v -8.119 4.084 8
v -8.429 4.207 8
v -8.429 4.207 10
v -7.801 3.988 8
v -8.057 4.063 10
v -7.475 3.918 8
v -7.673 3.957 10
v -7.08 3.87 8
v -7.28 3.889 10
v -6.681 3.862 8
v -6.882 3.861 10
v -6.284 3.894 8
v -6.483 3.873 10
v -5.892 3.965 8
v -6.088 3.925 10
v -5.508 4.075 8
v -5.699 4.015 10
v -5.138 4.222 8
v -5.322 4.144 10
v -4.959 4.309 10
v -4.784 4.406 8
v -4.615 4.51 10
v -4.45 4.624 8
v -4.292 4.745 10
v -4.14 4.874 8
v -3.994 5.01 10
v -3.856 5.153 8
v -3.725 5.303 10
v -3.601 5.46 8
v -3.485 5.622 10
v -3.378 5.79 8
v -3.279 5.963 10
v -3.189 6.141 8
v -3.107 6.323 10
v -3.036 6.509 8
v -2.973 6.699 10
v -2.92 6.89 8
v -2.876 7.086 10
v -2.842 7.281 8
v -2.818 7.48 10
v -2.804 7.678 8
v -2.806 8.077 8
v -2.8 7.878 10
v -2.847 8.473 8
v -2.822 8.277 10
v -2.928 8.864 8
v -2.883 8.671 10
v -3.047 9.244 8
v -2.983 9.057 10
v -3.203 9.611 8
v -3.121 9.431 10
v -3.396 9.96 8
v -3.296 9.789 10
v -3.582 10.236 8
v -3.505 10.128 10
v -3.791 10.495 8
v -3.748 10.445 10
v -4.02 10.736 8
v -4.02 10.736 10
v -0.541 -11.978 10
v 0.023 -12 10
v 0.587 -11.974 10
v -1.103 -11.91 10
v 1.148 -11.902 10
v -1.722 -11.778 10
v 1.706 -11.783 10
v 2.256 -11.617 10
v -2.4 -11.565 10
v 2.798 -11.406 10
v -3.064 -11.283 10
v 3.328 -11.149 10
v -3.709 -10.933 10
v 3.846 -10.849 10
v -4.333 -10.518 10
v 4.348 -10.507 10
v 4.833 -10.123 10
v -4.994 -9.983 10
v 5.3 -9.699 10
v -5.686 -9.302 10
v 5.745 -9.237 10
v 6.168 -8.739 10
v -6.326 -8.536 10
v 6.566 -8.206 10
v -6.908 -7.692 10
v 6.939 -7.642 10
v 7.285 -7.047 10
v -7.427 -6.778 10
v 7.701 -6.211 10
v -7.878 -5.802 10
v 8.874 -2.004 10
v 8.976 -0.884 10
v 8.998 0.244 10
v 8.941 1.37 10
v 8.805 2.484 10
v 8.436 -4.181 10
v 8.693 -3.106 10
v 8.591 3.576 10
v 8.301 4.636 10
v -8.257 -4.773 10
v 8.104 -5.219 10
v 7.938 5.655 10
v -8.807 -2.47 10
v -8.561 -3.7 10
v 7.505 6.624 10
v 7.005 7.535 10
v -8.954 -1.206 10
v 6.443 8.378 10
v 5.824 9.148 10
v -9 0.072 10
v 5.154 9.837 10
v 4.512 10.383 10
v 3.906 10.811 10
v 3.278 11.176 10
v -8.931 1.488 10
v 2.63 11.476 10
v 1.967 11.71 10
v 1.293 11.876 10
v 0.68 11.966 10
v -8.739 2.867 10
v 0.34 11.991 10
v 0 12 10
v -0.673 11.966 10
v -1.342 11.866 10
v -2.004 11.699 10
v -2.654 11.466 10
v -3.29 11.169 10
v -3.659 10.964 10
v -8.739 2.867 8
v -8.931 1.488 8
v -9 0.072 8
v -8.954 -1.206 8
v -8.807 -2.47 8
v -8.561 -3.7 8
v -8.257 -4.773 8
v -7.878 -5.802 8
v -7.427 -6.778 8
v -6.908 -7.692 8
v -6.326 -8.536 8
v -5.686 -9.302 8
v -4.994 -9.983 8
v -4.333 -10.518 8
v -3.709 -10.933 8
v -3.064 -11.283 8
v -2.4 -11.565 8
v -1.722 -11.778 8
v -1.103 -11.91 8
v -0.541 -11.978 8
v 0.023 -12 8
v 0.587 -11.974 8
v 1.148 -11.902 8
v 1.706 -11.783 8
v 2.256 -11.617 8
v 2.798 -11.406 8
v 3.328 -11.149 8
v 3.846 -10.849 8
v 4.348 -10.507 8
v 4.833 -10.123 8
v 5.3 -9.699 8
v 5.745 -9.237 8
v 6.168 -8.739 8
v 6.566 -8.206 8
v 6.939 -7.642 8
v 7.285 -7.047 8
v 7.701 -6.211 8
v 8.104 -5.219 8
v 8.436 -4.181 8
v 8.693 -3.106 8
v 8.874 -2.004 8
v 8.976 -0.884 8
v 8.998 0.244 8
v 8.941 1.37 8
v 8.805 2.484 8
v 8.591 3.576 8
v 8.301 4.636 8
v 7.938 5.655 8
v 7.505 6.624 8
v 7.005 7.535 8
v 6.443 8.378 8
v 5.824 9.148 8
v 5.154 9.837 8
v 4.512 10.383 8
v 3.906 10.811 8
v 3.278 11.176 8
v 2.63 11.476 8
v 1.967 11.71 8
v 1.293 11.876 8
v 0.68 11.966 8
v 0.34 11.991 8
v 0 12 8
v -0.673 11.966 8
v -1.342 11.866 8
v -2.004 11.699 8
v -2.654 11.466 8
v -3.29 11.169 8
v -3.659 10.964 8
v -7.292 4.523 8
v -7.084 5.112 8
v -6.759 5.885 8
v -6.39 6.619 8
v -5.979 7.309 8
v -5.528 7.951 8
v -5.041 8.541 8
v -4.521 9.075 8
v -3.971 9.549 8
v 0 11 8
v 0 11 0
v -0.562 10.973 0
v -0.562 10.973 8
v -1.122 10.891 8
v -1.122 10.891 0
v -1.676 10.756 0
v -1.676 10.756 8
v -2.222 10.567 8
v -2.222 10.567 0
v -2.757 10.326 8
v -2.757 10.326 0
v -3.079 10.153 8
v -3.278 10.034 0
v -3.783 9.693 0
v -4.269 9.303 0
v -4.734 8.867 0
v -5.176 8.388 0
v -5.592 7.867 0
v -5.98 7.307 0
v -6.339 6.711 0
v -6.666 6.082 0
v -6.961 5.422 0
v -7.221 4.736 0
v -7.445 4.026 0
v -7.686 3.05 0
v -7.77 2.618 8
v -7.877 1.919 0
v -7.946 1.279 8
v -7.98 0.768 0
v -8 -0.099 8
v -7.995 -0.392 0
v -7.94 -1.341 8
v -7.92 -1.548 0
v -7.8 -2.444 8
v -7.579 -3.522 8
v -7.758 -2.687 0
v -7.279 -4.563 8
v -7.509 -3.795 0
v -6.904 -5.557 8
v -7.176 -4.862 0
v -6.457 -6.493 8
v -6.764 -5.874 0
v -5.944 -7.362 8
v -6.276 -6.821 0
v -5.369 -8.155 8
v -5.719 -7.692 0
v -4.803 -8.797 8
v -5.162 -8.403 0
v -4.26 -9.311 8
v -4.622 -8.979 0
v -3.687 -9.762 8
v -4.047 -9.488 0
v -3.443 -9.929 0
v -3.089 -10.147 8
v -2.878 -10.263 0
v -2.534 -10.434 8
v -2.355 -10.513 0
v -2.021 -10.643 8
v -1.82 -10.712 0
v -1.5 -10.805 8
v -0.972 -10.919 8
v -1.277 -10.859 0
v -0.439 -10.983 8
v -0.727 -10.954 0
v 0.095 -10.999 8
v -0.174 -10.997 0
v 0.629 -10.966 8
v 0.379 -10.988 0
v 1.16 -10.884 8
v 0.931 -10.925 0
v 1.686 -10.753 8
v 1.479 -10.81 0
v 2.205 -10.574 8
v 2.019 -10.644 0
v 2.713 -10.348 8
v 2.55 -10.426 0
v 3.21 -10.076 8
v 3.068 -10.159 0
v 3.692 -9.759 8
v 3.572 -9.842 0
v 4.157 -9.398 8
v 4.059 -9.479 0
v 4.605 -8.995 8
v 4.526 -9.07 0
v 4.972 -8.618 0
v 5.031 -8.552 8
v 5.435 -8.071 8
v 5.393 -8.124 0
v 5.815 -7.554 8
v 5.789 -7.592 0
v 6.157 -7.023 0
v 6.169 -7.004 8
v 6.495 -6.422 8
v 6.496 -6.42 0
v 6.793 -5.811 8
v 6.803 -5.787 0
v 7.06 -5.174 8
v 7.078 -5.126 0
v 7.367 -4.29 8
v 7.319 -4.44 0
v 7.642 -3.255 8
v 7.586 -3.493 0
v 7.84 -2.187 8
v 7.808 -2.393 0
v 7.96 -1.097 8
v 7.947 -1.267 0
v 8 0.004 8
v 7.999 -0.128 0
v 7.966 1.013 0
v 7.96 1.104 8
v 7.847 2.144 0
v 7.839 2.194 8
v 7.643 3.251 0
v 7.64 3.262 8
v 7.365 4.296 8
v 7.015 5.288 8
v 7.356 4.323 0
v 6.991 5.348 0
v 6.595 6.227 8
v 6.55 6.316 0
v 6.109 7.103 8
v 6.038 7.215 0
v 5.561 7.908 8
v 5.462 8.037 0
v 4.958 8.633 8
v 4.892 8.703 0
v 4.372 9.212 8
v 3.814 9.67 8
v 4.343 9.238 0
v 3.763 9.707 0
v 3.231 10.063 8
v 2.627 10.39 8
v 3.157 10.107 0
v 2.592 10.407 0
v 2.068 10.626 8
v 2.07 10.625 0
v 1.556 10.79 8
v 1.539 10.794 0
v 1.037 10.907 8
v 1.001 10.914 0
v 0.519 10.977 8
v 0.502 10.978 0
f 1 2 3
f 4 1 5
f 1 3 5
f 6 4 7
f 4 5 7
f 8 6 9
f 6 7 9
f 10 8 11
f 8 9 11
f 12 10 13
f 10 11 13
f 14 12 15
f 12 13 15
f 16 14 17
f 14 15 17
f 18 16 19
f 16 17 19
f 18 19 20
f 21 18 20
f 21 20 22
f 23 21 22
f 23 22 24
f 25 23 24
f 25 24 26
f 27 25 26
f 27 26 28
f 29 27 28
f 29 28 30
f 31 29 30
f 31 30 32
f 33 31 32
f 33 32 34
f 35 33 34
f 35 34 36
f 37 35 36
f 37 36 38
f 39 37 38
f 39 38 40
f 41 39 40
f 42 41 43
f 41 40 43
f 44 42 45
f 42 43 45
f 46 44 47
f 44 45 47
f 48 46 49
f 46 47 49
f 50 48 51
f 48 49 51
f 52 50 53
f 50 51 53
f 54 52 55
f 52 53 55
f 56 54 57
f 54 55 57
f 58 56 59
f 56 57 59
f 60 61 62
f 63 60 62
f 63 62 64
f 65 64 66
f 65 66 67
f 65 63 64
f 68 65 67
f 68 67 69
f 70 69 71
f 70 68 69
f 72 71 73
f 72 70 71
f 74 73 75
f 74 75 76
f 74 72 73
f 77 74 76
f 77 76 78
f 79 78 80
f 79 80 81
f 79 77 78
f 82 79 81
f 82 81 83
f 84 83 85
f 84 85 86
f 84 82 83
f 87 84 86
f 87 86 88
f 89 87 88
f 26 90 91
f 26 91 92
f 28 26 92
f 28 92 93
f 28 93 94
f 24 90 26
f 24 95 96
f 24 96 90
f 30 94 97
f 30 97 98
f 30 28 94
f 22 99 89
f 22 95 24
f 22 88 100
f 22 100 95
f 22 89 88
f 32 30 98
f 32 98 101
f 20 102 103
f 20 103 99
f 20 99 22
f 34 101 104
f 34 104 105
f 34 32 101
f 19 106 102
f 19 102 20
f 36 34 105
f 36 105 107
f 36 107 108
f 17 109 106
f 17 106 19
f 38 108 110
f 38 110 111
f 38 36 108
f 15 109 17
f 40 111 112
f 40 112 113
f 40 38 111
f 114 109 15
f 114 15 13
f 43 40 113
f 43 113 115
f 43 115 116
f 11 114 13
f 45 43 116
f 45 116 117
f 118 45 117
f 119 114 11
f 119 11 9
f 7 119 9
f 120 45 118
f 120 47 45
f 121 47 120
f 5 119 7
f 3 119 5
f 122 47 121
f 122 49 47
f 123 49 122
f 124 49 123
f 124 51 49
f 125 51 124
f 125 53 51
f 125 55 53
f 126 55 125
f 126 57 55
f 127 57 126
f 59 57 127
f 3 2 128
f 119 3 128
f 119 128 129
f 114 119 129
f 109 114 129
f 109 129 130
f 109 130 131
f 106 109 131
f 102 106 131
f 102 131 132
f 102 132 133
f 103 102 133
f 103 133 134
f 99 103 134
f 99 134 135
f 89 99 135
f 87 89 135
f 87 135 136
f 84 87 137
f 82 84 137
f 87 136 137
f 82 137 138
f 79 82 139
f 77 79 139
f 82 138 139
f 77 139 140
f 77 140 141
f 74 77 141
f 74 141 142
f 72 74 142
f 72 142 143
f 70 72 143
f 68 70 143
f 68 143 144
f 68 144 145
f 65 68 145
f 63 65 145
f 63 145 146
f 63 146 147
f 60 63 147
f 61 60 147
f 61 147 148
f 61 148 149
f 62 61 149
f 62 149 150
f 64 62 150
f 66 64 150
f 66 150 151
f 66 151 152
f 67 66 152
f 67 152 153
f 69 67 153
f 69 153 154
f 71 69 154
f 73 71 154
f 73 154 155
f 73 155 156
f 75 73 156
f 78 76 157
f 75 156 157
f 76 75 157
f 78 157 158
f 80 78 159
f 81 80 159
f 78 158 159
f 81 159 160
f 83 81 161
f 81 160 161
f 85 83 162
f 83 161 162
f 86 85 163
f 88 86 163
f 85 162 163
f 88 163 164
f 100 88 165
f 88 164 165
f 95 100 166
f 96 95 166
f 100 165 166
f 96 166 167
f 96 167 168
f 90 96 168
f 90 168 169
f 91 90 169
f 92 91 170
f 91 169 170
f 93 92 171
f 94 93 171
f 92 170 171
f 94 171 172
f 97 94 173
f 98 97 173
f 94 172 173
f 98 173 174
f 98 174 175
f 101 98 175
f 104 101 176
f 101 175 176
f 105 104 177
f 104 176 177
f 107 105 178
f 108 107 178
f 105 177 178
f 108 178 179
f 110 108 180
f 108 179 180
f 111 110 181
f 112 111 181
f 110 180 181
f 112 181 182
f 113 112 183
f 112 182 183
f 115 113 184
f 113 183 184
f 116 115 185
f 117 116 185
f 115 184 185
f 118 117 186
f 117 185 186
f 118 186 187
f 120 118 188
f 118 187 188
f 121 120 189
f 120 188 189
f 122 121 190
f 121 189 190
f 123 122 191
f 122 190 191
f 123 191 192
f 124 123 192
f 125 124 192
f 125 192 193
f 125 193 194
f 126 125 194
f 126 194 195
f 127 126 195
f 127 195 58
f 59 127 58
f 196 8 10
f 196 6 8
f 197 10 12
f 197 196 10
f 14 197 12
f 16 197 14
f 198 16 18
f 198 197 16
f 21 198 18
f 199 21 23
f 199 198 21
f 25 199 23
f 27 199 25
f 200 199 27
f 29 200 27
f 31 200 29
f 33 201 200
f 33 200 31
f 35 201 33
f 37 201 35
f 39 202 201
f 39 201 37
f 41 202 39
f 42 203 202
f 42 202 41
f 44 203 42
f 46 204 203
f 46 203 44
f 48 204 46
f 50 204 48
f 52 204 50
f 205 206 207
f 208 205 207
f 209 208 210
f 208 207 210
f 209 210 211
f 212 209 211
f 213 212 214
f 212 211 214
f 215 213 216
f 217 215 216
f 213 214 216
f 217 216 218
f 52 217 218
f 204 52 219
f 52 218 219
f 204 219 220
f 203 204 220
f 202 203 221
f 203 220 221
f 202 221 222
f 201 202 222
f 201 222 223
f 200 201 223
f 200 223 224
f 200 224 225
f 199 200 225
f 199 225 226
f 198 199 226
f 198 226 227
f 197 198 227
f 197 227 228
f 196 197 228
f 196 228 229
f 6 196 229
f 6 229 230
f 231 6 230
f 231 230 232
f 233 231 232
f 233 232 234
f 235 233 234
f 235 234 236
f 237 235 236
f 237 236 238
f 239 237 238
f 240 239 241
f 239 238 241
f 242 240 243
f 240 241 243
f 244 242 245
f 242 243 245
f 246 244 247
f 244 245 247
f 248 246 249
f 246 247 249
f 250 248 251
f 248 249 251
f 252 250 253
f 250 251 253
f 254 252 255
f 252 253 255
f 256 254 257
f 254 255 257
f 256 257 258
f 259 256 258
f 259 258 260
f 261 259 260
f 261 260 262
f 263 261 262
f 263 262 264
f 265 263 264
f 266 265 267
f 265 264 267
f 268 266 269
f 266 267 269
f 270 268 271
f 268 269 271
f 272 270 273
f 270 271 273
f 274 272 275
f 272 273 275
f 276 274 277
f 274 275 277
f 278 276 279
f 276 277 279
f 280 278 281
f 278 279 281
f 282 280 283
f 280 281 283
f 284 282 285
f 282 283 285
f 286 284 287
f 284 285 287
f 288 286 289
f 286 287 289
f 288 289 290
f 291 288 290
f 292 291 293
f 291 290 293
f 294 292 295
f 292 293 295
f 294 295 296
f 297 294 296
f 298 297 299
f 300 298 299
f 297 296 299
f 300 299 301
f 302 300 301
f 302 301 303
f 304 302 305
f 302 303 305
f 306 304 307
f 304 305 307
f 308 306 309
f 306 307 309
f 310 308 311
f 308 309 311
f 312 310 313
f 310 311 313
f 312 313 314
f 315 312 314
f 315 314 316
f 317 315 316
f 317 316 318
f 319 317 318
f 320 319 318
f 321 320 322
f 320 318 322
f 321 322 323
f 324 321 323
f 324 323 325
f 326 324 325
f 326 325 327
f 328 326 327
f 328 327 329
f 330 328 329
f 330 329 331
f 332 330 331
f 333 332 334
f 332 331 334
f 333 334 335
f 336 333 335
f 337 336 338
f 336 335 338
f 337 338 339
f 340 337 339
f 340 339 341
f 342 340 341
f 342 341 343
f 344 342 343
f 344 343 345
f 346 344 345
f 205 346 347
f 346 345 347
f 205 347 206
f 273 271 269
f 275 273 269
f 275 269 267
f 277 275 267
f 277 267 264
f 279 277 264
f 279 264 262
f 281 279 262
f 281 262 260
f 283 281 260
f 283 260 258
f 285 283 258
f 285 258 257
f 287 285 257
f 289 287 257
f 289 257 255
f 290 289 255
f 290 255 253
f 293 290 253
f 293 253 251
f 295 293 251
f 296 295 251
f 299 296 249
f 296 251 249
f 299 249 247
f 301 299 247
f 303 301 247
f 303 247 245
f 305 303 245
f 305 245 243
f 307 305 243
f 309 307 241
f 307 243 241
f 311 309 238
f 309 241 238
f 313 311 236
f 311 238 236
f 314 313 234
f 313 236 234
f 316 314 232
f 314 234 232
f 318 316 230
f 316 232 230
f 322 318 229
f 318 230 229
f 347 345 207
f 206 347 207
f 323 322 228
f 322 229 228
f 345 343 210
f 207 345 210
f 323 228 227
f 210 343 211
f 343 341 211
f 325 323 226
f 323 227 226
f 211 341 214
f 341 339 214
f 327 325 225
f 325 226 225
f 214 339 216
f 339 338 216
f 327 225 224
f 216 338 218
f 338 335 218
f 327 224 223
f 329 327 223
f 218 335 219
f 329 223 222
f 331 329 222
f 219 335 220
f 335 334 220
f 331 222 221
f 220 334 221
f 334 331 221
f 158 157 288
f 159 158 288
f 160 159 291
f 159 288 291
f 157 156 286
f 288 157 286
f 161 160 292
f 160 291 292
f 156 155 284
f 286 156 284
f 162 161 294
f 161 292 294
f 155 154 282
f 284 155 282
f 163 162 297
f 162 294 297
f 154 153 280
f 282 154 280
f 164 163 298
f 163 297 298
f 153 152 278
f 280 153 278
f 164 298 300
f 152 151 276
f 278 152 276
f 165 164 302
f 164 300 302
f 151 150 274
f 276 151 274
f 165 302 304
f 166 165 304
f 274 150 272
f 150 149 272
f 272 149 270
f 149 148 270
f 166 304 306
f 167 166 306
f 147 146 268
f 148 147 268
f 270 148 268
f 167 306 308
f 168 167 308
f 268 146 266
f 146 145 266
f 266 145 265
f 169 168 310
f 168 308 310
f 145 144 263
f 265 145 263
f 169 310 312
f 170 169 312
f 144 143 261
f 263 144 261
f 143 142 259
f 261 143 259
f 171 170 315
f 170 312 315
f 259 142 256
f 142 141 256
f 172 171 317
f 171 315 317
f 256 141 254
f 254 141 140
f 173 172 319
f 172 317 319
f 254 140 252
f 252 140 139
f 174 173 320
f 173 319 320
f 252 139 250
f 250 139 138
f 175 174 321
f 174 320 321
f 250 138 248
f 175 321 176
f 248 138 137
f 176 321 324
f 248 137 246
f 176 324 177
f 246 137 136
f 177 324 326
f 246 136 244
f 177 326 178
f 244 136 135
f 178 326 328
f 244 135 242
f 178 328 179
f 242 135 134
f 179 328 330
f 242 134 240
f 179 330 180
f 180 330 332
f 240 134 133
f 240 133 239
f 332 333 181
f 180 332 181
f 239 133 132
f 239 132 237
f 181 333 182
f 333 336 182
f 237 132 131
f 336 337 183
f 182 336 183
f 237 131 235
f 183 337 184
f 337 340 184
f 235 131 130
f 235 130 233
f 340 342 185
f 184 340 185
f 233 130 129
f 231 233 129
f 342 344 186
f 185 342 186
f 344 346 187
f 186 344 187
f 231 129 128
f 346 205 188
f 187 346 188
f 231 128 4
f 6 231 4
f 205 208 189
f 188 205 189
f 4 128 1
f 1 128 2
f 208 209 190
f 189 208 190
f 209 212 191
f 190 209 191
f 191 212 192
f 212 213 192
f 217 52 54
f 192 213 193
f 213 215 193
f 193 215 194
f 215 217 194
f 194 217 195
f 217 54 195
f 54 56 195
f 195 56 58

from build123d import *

# Parameters (mm, degrees)
CROQUIS1_RX             = 11
CROQUIS1_RY             = 8
SALIENTE_EXTRUIR1_DEPTH = 8
CROQUIS2_RX             = 12
CROQUIS2_RY             = 9
SALIENTE_EXTRUIR2_DEPTH = 2
CROQUIS3_R              = 4
CORTAR_EXTRUIR1_DEPTH   = 2


with BuildPart() as part:
    # Croquis1 → Saliente-Extruir1 (new body)
    with BuildSketch(Plane.XY):
        with Locations(Location((0, 0), (0, 0, 90))):
            Ellipse(CROQUIS1_RX, CROQUIS1_RY)
    extrude(amount=SALIENTE_EXTRUIR1_DEPTH)

    # Croquis2 → Saliente-Extruir2 (add)
    with BuildSketch(Plane.XY.offset(8)):
        with Locations(Location((0, 0), (0, 0, 90))):
            Ellipse(CROQUIS2_RX, CROQUIS2_RY)
    extrude(amount=SALIENTE_EXTRUIR2_DEPTH)

    # Croquis3 → Cortar-Extruir1 (cut)
    with BuildSketch(Plane.XY.offset(10)):
        with Locations((-6.800291845, 7.860566089)):
            Circle(CROQUIS3_R)
    extrude(amount=-CORTAR_EXTRUIR1_DEPTH, mode=Mode.SUBTRACT)


solid = part.part
